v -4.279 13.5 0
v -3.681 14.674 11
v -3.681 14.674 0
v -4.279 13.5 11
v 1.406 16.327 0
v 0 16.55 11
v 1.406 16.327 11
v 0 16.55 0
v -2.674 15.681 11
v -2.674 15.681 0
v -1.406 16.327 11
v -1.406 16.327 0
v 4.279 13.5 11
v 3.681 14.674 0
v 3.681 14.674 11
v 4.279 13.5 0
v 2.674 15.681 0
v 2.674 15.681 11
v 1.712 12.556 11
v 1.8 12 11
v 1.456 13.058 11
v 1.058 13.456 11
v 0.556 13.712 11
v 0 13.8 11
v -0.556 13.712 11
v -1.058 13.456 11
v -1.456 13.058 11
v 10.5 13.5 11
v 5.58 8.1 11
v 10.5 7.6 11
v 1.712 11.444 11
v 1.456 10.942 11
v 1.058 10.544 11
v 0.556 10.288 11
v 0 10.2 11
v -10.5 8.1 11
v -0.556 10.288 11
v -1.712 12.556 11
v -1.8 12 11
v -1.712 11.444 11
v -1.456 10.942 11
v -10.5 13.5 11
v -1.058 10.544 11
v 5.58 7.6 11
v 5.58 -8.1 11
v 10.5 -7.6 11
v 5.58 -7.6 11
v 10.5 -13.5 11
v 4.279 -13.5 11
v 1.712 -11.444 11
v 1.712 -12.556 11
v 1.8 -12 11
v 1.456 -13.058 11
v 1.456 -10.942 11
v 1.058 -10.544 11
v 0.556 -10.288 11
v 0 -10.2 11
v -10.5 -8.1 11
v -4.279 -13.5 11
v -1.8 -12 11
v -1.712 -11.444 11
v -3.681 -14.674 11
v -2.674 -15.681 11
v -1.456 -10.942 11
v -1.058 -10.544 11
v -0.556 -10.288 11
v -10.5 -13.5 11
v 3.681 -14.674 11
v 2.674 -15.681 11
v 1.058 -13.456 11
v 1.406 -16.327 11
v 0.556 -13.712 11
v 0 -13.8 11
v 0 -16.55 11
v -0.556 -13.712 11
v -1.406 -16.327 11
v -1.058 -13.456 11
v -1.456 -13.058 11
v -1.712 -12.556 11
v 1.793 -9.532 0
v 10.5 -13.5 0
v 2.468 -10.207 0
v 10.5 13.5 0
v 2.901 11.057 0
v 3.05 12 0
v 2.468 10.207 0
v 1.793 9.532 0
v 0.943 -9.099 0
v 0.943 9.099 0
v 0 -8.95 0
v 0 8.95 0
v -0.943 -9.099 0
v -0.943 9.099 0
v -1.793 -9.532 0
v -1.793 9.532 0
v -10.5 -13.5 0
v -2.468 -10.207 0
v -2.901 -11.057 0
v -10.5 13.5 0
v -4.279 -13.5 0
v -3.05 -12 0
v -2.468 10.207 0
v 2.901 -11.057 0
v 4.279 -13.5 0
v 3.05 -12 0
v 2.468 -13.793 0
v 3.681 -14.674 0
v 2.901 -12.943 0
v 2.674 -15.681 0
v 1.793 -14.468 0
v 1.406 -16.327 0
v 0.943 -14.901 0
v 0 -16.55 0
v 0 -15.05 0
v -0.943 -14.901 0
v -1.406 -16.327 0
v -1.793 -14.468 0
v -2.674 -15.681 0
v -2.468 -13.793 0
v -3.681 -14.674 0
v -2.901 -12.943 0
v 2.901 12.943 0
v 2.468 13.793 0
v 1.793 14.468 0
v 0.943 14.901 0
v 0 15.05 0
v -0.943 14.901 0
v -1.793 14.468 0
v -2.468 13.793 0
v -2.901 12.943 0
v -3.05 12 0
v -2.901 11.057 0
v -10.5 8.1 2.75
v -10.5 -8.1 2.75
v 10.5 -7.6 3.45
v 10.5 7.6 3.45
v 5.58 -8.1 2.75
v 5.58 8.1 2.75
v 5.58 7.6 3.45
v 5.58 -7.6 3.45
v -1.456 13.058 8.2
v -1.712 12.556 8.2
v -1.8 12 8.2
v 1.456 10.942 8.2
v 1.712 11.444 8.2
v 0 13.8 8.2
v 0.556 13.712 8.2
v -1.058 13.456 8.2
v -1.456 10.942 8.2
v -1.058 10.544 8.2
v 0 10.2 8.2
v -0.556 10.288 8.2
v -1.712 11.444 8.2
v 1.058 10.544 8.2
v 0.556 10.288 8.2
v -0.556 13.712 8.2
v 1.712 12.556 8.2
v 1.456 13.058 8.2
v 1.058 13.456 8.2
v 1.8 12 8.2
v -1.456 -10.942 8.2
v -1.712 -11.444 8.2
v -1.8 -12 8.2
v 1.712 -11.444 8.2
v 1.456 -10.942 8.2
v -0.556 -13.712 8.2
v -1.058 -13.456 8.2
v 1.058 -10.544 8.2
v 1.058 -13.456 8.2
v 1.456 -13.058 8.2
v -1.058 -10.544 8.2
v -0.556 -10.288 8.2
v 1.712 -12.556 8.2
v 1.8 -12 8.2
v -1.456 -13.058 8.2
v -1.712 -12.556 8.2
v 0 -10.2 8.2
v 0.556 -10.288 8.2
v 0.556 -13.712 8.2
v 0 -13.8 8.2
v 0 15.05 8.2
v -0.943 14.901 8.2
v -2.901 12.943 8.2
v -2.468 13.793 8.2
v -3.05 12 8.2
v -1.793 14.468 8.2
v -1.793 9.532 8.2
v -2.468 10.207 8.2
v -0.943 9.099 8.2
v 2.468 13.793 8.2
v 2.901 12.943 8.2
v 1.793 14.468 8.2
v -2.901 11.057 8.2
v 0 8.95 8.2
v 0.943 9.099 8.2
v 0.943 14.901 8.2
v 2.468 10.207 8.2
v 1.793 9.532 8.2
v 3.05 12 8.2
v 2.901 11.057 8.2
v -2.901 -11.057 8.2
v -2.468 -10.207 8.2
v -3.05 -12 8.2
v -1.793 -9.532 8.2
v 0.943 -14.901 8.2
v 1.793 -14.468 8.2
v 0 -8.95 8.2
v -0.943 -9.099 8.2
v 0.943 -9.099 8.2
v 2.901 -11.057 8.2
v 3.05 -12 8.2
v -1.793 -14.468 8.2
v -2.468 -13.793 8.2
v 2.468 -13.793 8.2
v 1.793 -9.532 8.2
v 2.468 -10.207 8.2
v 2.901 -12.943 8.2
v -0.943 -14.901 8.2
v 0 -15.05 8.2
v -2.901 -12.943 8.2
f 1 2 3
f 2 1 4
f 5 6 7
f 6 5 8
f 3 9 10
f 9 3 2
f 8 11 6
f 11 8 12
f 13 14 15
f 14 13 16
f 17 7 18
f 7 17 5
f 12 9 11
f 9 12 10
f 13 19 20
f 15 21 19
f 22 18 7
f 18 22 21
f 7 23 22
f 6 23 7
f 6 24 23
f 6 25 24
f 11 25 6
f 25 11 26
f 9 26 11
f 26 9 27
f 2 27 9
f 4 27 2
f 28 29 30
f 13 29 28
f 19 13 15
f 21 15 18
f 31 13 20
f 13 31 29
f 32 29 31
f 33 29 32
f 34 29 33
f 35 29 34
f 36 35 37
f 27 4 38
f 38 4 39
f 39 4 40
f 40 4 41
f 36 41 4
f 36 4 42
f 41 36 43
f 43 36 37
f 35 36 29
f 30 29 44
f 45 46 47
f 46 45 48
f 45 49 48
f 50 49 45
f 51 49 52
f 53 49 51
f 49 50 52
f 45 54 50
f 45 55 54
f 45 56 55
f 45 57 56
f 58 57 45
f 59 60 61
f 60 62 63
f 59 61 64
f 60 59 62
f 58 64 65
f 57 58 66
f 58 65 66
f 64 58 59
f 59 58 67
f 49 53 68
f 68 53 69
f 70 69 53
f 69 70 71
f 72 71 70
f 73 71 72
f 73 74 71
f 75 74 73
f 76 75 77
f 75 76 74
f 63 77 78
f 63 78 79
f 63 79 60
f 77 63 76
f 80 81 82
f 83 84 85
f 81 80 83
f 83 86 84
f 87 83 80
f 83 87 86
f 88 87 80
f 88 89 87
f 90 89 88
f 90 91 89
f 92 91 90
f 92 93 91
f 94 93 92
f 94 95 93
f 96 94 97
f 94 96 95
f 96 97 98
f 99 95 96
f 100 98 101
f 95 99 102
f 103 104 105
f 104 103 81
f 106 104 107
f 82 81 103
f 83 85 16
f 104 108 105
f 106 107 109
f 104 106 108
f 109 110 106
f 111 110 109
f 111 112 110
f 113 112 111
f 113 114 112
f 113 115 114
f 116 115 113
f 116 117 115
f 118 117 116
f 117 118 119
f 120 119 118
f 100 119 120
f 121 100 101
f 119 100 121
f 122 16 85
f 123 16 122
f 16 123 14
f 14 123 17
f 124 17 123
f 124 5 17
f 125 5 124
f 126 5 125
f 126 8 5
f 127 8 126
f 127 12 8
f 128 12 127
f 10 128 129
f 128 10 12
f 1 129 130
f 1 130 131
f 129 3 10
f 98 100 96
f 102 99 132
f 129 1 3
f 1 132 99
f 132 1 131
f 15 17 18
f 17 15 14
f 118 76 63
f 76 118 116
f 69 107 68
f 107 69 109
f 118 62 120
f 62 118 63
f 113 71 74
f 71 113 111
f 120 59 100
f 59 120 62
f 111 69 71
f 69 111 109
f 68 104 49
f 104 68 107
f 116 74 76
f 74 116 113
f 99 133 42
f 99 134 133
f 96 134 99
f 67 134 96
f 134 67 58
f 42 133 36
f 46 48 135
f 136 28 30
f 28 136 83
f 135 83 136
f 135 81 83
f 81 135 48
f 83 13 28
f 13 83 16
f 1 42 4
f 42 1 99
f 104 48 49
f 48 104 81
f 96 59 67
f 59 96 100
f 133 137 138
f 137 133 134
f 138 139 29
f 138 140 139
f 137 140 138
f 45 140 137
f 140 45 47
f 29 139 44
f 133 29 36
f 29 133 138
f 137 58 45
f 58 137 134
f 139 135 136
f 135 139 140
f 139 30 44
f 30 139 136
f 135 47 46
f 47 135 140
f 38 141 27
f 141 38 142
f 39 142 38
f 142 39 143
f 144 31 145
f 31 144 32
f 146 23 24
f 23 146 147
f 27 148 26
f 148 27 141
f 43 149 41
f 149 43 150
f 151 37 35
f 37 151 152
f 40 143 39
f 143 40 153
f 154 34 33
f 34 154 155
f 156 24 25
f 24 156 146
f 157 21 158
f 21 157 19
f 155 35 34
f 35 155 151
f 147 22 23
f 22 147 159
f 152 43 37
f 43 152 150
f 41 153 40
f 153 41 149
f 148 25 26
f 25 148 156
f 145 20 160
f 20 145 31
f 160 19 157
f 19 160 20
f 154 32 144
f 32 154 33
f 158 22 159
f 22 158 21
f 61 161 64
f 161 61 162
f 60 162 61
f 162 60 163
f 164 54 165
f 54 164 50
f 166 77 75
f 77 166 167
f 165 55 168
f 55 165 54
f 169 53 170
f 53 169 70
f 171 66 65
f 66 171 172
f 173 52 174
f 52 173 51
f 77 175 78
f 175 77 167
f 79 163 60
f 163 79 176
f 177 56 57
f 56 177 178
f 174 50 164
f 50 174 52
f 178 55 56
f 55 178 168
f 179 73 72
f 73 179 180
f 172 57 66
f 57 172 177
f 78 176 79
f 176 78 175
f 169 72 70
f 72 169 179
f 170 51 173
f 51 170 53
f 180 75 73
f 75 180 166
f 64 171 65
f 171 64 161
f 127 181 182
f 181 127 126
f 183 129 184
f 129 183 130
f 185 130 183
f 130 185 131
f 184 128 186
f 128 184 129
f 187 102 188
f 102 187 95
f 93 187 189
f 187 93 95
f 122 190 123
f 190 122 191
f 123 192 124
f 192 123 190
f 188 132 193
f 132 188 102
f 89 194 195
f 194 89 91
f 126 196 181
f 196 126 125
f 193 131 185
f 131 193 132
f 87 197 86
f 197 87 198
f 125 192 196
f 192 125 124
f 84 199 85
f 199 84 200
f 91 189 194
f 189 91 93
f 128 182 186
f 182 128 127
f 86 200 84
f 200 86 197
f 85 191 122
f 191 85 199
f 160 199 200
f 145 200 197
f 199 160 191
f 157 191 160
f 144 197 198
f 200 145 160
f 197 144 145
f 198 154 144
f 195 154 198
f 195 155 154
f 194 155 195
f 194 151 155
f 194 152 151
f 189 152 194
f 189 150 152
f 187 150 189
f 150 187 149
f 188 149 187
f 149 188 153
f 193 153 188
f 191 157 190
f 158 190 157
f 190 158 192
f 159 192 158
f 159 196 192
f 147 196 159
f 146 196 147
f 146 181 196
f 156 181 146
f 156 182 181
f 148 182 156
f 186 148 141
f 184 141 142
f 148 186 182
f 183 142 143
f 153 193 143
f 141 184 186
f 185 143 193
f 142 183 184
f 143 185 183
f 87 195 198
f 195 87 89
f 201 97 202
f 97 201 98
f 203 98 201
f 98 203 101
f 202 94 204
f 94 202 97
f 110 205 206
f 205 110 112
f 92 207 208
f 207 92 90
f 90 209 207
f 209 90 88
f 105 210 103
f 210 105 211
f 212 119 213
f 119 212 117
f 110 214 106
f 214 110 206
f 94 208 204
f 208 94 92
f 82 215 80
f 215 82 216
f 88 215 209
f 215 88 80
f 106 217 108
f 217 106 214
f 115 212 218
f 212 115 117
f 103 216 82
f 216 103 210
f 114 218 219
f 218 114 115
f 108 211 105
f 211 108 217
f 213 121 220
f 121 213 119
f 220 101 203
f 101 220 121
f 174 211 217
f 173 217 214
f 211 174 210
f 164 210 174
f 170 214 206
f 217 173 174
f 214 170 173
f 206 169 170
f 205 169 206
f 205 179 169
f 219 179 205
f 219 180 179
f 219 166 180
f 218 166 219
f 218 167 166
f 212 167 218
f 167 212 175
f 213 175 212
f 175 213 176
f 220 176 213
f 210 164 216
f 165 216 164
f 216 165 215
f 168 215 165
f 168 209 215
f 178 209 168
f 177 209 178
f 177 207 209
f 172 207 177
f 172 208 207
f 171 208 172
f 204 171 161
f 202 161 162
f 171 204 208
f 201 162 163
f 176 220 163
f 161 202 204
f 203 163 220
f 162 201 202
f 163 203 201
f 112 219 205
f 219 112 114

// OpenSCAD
// EMAX nighthawk accessories  - a OpenSCAD 
// Copyright (C) 2016  Gerard Valade

// This program is free software: you can redistribute it and/or modify
// it under the terms of the GNU General Public License as published by
// the Free Software Foundation, either version 3 of the License, or
// (at your option) any later version.

// This program is distributed in the hope that it will be useful,
// but WITHOUT ANY WARRANTY; without even the implied warranty of
// MERCHANTABILITY or FITNESS FOR A PARTICULAR PURPOSE.  See the
// GNU General Public License for more details.

// You should have received a copy of the GNU General Public License
// along with this program.  If not, see <http://www.gnu.org/licenses/>.

$fn=30;


M3_dia = 3.6;
M3_hole = 2.5;
M3_hexa = 5.4+0.4;
M3_head_hole = 5.4+0.7;

module hexaprismx(
	ri =  1.0,  // radius of inscribed circle
	h  =  1.0)  // height of hexaprism
{ // -----------------------------------------------

	ra = ri*2/sqrt(3);
	cylinder(r = ra, h=h, $fn=6, center=false);
}



xt60_length = 21;
xt60_width = 27;
xt60_heigth = 11;

function xt60_length() = xt60_length;
function xt60_width() = xt60_width;
function xt60_heigth() = xt60_heigth;


module xt60_footprint(cut=4)
{
	hh = 8.3;
	#difference() {
		union() {
			translate([0, 0, hh/2-0.05]) cube([16.2, 16.2, hh], center=true);
			translate([-16 + 0.02, 0, -2.2+4]) cube([16, 15.2, 11.5], center=true);
		}
		//translate([0, 8.1+1, hh/2+4]) rotate([45, 0, 0]) cube([xt60_length-4.5,cut,cut], center=true);
	}
}
	

module xt60_screw_hole(dia=2.2, h=10, $fn=20)
{
	for(x=[0]) for(y=[1, -1]) translate([x*8, y*12, 0]) {
		cylinder(d=dia, h=h, center=true);
	}	
}

module xt60_bracket()
{
	module plain()
	{
		translate([0,0,(xt60_heigth)/2])  cube([xt60_length,xt60_width,xt60_heigth], center=true);
		translate([0,0,(xt60_heigth)/2]) xt60_screw_hole(dia=M3_head_hole+3, h=xt60_heigth);
	}
	module hole()
	{
		translate([(xt60_length-20)/2+0.02, 0, 0]) {
			xt60_footprint();
		}
	}

	translate([0, 0, xt60_heigth]) rotate([0, 180, 0]) {
		difference()
		{
			plain();
			translate([2, 0, 0]) hole();
			translate([0, 0, xt60_heigth/2]) xt60_screw_hole(M3_dia, h=xt60_heigth+1);
			translate([0, 0, xt60_heigth/2+2.8]) xt60_screw_hole(M3_head_hole, h=xt60_heigth);
		}
	}
}



translate([0, 0, 0])  rotate([0, 0, 0]) xt60_bracket();
